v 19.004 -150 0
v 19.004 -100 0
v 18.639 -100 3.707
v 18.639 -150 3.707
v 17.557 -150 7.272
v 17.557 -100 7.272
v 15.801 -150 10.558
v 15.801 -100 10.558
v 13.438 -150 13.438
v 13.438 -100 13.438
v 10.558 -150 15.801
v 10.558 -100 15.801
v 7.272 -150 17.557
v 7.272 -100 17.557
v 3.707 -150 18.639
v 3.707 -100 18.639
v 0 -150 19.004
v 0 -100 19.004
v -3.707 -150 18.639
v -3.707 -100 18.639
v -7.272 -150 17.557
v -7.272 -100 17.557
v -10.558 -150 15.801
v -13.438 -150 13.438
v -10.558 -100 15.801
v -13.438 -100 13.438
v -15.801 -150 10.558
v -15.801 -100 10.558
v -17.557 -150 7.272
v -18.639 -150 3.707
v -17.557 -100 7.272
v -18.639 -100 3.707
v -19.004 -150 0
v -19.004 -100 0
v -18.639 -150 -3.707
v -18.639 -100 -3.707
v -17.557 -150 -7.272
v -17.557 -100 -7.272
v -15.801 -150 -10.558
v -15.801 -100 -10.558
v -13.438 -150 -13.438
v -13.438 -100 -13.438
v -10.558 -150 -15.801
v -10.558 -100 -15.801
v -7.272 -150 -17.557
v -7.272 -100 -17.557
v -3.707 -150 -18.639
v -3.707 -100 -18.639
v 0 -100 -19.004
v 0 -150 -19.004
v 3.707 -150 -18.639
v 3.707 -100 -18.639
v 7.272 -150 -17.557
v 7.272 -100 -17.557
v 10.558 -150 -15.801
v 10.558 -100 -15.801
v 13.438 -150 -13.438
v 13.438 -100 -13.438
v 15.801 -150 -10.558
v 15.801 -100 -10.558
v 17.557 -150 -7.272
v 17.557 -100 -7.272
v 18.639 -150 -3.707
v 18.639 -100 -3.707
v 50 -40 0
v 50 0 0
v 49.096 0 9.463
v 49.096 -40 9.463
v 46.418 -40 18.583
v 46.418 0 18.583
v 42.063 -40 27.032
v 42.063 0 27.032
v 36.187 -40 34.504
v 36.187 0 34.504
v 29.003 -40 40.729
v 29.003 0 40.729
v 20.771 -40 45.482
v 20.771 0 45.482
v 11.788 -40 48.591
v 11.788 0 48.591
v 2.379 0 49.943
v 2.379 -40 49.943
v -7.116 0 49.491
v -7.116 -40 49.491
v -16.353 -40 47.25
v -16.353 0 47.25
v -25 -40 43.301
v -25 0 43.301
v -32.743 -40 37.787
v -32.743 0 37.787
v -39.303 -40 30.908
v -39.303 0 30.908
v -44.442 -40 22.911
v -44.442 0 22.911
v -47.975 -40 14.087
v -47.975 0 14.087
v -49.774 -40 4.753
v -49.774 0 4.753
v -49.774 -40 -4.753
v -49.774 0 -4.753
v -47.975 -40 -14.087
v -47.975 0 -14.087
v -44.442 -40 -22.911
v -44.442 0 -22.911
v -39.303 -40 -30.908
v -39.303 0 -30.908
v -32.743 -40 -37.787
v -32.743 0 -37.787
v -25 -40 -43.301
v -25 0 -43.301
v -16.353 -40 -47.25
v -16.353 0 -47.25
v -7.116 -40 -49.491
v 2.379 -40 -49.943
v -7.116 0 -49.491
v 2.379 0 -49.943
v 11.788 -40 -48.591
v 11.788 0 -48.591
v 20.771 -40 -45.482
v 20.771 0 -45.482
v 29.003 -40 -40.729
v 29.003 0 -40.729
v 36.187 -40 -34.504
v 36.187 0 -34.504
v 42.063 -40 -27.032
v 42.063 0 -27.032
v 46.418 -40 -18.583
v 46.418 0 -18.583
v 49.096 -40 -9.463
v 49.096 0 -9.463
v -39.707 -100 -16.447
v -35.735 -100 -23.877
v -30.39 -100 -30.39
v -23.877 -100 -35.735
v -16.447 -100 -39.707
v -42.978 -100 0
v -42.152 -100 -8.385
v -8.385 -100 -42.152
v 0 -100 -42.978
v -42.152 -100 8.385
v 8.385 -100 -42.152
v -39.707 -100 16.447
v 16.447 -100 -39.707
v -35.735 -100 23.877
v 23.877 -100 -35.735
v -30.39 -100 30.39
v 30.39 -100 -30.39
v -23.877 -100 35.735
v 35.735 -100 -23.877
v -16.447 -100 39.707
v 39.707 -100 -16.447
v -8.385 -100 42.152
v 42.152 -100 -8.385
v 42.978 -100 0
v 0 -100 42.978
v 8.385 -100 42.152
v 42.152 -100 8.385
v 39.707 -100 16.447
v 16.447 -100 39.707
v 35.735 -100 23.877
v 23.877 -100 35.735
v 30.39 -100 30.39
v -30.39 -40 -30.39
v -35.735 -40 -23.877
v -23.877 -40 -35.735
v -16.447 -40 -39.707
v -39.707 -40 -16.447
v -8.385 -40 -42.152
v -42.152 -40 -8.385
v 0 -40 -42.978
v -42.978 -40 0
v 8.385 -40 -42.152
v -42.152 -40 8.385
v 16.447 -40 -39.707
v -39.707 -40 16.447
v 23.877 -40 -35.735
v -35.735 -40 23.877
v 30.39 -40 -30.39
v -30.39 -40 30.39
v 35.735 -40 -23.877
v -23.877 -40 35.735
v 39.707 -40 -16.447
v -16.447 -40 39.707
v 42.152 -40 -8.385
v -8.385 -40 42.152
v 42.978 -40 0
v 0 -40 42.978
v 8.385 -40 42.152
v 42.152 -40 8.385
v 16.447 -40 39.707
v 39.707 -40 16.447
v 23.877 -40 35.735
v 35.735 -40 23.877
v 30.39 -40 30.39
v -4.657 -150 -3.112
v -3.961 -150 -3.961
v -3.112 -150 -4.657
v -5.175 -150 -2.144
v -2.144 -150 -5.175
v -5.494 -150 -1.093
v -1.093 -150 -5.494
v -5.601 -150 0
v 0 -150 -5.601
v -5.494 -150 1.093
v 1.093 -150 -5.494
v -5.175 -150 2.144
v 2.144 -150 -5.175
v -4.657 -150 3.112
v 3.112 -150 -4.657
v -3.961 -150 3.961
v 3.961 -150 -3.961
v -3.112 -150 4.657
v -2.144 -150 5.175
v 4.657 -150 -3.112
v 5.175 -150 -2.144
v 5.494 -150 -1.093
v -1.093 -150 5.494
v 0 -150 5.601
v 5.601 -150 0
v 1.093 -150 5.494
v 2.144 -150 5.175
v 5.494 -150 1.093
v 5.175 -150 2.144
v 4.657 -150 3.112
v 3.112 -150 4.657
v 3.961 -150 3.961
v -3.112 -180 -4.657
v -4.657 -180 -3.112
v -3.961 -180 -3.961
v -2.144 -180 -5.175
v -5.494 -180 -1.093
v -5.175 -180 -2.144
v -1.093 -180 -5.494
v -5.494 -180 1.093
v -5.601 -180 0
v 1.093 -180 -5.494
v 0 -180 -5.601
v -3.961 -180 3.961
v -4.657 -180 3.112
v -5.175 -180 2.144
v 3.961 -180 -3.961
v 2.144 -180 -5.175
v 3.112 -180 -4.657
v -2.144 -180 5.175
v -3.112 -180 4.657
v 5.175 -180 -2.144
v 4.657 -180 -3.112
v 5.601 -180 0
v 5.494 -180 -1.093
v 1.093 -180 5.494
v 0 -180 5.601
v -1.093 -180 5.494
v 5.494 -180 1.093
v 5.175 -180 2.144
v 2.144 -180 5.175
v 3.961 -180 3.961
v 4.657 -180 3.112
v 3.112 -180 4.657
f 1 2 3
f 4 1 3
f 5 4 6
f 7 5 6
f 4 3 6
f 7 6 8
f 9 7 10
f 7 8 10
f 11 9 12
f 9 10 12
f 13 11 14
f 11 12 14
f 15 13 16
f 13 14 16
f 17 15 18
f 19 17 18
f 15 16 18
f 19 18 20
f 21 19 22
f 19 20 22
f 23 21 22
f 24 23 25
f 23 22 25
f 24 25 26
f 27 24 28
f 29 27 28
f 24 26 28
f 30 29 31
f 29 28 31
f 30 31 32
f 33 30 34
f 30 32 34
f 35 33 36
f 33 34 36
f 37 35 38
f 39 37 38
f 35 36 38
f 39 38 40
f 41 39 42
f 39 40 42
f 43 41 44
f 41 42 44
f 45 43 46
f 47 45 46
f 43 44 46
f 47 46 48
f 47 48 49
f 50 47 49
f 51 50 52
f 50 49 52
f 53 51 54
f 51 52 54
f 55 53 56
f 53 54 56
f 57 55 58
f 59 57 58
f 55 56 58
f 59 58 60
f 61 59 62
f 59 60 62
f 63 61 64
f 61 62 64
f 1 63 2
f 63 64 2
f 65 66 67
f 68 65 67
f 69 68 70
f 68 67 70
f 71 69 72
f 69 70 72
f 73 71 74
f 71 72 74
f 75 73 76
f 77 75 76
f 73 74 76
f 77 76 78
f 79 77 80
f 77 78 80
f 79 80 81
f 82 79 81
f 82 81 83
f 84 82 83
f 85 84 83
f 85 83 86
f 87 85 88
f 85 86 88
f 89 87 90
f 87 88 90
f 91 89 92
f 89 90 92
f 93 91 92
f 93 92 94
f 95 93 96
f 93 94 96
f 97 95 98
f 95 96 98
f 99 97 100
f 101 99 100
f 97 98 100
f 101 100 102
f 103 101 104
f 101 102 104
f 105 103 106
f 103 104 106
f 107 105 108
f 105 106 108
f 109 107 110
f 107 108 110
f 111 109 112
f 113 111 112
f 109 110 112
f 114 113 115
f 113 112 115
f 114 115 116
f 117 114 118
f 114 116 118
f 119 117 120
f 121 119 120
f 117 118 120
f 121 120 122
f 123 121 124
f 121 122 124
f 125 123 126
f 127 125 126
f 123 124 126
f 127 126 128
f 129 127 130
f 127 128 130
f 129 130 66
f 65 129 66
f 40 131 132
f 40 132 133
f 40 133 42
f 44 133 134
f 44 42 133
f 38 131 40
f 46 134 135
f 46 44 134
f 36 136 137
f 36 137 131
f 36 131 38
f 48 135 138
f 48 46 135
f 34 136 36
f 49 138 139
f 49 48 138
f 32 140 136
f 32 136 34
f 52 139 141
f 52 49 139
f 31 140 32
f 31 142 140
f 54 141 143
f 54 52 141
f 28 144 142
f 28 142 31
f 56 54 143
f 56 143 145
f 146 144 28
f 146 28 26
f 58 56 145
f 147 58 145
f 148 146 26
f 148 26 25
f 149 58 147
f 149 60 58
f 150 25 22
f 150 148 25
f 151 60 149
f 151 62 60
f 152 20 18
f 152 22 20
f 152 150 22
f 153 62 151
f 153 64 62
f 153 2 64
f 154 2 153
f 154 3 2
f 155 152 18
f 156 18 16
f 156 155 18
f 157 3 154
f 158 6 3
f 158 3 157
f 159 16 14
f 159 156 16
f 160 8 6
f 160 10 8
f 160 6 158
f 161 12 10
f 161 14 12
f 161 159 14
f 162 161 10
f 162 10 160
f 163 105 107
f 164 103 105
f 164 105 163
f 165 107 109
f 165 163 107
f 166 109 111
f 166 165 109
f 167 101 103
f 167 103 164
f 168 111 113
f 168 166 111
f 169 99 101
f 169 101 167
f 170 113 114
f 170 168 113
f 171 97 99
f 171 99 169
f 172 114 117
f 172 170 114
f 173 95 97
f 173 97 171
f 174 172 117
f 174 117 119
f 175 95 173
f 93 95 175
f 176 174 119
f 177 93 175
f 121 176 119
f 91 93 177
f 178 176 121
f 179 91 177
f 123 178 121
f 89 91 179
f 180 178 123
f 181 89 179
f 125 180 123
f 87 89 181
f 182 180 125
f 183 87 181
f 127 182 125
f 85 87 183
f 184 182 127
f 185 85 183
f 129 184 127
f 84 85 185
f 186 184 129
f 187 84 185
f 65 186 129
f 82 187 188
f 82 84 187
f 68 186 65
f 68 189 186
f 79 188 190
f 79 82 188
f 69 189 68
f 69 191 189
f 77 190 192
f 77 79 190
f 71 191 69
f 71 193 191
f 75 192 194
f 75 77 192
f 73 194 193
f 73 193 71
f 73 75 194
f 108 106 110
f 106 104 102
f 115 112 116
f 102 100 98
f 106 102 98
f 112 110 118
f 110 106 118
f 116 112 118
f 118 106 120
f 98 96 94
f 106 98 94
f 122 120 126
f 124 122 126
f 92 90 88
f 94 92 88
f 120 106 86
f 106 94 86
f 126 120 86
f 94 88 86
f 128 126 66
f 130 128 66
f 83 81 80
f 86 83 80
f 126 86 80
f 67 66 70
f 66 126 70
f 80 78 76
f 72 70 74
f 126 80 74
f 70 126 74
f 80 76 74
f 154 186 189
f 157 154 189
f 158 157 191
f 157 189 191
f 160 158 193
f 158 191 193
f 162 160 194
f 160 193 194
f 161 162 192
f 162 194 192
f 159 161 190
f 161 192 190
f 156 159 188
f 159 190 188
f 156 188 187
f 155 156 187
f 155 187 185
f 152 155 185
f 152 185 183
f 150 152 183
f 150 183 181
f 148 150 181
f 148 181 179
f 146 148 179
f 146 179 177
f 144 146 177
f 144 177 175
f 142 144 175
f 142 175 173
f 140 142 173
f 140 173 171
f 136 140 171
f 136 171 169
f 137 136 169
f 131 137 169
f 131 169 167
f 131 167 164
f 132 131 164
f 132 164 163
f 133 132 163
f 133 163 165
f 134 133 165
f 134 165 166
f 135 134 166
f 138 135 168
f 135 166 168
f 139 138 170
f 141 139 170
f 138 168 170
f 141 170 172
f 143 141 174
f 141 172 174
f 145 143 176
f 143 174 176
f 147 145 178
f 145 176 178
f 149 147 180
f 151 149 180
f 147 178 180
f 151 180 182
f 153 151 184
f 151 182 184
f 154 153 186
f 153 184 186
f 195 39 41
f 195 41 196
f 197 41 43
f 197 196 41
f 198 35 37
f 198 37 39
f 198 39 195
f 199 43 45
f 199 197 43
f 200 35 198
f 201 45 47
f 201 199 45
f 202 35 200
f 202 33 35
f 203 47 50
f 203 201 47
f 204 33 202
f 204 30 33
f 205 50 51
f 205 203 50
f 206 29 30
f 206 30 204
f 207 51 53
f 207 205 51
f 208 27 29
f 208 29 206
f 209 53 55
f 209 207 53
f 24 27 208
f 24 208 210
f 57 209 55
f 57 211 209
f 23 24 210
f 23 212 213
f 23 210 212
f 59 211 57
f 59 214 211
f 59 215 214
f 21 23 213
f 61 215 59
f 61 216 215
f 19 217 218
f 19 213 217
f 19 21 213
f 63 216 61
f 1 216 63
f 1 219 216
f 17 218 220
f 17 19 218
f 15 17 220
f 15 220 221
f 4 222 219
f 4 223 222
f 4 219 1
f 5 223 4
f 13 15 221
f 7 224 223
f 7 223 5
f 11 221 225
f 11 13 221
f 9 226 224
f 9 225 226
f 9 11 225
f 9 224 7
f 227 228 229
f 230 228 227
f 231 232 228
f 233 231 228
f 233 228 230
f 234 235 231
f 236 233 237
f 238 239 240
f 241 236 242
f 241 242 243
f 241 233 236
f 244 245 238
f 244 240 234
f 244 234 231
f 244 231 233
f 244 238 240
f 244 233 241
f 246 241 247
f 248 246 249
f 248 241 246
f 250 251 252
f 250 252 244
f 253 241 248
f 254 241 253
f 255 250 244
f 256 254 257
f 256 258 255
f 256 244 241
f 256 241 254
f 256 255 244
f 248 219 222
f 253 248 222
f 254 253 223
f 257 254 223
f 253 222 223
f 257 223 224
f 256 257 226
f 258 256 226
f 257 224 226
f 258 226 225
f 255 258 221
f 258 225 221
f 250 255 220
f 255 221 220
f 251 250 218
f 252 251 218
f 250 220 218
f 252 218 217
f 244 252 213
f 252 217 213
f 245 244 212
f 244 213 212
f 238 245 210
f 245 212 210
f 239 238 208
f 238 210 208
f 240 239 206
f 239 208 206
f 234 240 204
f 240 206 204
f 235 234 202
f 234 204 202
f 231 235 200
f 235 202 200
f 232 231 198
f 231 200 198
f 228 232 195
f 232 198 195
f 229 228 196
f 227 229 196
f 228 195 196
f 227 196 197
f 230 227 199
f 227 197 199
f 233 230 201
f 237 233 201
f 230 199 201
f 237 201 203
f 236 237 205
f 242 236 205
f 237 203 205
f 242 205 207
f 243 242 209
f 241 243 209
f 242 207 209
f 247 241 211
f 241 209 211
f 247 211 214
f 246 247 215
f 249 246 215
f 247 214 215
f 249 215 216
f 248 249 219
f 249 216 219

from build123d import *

# Parameters (mm, degrees)
F0_R     = 50
F1_DEPTH = 40
F2_R     = 42.978315
F3_DEPTH = 100
F4_R     = 19.003957
F5_DEPTH = 50
F6_R     = 5.601442
F7_DEPTH = 30


with BuildPart() as f1:
    # F0 (on Front) → F1 (new body)
    with BuildSketch(Plane.XZ):
        Circle(F0_R)
    extrude(amount=F1_DEPTH)

    # F2 (on Front) → F3 (join)
    with BuildSketch(Plane.XZ):
        Circle(F2_R)
    extrude(amount=F3_DEPTH)

    # F4 (on face) → F5 (join)
    with BuildSketch(Plane.XZ.offset(100)):
        Circle(F4_R)
    extrude(amount=F5_DEPTH)

    # F6 (on face) → F7 (join)
    with BuildSketch(Plane.XZ.offset(150)):
        Circle(F6_R)
    extrude(amount=F7_DEPTH)


solid = f1.part
